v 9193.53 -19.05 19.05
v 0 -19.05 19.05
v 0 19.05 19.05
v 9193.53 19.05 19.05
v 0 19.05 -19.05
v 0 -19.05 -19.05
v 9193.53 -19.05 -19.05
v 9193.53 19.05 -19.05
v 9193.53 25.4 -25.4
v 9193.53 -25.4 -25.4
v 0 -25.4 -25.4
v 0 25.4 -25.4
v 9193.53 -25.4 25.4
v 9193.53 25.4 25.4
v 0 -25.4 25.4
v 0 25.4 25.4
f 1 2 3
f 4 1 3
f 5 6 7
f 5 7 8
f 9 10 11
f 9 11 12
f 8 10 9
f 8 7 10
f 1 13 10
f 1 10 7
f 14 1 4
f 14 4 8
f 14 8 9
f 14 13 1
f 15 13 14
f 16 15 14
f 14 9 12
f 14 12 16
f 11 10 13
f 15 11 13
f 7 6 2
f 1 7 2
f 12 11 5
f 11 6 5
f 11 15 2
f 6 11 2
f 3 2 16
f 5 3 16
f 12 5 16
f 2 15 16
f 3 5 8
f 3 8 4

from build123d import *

# Parameters (mm, degrees)
SKETCH11_W                                     = 50.8
SKETCH11_H                                     = 50.8
SKETCH11_W_2                                   = 38.1
SKETCH11_H_2                                   = 38.1
AL_TUBE_SQUARE_AL_TUBE_2_SQR_X_0_25_WALL_DEPTH = 9193.53


with BuildPart() as part:
    # Sketch11 → Al tube square AL TUBE 2 SQR X 0.25 WALL(1) (new body)
    with BuildSketch(Plane.YZ):
        Rectangle(SKETCH11_W, SKETCH11_H)
        Rectangle(SKETCH11_W_2, SKETCH11_H_2, mode=Mode.SUBTRACT)
    extrude(amount=AL_TUBE_SQUARE_AL_TUBE_2_SQR_X_0_25_WALL_DEPTH)


solid = part.part
